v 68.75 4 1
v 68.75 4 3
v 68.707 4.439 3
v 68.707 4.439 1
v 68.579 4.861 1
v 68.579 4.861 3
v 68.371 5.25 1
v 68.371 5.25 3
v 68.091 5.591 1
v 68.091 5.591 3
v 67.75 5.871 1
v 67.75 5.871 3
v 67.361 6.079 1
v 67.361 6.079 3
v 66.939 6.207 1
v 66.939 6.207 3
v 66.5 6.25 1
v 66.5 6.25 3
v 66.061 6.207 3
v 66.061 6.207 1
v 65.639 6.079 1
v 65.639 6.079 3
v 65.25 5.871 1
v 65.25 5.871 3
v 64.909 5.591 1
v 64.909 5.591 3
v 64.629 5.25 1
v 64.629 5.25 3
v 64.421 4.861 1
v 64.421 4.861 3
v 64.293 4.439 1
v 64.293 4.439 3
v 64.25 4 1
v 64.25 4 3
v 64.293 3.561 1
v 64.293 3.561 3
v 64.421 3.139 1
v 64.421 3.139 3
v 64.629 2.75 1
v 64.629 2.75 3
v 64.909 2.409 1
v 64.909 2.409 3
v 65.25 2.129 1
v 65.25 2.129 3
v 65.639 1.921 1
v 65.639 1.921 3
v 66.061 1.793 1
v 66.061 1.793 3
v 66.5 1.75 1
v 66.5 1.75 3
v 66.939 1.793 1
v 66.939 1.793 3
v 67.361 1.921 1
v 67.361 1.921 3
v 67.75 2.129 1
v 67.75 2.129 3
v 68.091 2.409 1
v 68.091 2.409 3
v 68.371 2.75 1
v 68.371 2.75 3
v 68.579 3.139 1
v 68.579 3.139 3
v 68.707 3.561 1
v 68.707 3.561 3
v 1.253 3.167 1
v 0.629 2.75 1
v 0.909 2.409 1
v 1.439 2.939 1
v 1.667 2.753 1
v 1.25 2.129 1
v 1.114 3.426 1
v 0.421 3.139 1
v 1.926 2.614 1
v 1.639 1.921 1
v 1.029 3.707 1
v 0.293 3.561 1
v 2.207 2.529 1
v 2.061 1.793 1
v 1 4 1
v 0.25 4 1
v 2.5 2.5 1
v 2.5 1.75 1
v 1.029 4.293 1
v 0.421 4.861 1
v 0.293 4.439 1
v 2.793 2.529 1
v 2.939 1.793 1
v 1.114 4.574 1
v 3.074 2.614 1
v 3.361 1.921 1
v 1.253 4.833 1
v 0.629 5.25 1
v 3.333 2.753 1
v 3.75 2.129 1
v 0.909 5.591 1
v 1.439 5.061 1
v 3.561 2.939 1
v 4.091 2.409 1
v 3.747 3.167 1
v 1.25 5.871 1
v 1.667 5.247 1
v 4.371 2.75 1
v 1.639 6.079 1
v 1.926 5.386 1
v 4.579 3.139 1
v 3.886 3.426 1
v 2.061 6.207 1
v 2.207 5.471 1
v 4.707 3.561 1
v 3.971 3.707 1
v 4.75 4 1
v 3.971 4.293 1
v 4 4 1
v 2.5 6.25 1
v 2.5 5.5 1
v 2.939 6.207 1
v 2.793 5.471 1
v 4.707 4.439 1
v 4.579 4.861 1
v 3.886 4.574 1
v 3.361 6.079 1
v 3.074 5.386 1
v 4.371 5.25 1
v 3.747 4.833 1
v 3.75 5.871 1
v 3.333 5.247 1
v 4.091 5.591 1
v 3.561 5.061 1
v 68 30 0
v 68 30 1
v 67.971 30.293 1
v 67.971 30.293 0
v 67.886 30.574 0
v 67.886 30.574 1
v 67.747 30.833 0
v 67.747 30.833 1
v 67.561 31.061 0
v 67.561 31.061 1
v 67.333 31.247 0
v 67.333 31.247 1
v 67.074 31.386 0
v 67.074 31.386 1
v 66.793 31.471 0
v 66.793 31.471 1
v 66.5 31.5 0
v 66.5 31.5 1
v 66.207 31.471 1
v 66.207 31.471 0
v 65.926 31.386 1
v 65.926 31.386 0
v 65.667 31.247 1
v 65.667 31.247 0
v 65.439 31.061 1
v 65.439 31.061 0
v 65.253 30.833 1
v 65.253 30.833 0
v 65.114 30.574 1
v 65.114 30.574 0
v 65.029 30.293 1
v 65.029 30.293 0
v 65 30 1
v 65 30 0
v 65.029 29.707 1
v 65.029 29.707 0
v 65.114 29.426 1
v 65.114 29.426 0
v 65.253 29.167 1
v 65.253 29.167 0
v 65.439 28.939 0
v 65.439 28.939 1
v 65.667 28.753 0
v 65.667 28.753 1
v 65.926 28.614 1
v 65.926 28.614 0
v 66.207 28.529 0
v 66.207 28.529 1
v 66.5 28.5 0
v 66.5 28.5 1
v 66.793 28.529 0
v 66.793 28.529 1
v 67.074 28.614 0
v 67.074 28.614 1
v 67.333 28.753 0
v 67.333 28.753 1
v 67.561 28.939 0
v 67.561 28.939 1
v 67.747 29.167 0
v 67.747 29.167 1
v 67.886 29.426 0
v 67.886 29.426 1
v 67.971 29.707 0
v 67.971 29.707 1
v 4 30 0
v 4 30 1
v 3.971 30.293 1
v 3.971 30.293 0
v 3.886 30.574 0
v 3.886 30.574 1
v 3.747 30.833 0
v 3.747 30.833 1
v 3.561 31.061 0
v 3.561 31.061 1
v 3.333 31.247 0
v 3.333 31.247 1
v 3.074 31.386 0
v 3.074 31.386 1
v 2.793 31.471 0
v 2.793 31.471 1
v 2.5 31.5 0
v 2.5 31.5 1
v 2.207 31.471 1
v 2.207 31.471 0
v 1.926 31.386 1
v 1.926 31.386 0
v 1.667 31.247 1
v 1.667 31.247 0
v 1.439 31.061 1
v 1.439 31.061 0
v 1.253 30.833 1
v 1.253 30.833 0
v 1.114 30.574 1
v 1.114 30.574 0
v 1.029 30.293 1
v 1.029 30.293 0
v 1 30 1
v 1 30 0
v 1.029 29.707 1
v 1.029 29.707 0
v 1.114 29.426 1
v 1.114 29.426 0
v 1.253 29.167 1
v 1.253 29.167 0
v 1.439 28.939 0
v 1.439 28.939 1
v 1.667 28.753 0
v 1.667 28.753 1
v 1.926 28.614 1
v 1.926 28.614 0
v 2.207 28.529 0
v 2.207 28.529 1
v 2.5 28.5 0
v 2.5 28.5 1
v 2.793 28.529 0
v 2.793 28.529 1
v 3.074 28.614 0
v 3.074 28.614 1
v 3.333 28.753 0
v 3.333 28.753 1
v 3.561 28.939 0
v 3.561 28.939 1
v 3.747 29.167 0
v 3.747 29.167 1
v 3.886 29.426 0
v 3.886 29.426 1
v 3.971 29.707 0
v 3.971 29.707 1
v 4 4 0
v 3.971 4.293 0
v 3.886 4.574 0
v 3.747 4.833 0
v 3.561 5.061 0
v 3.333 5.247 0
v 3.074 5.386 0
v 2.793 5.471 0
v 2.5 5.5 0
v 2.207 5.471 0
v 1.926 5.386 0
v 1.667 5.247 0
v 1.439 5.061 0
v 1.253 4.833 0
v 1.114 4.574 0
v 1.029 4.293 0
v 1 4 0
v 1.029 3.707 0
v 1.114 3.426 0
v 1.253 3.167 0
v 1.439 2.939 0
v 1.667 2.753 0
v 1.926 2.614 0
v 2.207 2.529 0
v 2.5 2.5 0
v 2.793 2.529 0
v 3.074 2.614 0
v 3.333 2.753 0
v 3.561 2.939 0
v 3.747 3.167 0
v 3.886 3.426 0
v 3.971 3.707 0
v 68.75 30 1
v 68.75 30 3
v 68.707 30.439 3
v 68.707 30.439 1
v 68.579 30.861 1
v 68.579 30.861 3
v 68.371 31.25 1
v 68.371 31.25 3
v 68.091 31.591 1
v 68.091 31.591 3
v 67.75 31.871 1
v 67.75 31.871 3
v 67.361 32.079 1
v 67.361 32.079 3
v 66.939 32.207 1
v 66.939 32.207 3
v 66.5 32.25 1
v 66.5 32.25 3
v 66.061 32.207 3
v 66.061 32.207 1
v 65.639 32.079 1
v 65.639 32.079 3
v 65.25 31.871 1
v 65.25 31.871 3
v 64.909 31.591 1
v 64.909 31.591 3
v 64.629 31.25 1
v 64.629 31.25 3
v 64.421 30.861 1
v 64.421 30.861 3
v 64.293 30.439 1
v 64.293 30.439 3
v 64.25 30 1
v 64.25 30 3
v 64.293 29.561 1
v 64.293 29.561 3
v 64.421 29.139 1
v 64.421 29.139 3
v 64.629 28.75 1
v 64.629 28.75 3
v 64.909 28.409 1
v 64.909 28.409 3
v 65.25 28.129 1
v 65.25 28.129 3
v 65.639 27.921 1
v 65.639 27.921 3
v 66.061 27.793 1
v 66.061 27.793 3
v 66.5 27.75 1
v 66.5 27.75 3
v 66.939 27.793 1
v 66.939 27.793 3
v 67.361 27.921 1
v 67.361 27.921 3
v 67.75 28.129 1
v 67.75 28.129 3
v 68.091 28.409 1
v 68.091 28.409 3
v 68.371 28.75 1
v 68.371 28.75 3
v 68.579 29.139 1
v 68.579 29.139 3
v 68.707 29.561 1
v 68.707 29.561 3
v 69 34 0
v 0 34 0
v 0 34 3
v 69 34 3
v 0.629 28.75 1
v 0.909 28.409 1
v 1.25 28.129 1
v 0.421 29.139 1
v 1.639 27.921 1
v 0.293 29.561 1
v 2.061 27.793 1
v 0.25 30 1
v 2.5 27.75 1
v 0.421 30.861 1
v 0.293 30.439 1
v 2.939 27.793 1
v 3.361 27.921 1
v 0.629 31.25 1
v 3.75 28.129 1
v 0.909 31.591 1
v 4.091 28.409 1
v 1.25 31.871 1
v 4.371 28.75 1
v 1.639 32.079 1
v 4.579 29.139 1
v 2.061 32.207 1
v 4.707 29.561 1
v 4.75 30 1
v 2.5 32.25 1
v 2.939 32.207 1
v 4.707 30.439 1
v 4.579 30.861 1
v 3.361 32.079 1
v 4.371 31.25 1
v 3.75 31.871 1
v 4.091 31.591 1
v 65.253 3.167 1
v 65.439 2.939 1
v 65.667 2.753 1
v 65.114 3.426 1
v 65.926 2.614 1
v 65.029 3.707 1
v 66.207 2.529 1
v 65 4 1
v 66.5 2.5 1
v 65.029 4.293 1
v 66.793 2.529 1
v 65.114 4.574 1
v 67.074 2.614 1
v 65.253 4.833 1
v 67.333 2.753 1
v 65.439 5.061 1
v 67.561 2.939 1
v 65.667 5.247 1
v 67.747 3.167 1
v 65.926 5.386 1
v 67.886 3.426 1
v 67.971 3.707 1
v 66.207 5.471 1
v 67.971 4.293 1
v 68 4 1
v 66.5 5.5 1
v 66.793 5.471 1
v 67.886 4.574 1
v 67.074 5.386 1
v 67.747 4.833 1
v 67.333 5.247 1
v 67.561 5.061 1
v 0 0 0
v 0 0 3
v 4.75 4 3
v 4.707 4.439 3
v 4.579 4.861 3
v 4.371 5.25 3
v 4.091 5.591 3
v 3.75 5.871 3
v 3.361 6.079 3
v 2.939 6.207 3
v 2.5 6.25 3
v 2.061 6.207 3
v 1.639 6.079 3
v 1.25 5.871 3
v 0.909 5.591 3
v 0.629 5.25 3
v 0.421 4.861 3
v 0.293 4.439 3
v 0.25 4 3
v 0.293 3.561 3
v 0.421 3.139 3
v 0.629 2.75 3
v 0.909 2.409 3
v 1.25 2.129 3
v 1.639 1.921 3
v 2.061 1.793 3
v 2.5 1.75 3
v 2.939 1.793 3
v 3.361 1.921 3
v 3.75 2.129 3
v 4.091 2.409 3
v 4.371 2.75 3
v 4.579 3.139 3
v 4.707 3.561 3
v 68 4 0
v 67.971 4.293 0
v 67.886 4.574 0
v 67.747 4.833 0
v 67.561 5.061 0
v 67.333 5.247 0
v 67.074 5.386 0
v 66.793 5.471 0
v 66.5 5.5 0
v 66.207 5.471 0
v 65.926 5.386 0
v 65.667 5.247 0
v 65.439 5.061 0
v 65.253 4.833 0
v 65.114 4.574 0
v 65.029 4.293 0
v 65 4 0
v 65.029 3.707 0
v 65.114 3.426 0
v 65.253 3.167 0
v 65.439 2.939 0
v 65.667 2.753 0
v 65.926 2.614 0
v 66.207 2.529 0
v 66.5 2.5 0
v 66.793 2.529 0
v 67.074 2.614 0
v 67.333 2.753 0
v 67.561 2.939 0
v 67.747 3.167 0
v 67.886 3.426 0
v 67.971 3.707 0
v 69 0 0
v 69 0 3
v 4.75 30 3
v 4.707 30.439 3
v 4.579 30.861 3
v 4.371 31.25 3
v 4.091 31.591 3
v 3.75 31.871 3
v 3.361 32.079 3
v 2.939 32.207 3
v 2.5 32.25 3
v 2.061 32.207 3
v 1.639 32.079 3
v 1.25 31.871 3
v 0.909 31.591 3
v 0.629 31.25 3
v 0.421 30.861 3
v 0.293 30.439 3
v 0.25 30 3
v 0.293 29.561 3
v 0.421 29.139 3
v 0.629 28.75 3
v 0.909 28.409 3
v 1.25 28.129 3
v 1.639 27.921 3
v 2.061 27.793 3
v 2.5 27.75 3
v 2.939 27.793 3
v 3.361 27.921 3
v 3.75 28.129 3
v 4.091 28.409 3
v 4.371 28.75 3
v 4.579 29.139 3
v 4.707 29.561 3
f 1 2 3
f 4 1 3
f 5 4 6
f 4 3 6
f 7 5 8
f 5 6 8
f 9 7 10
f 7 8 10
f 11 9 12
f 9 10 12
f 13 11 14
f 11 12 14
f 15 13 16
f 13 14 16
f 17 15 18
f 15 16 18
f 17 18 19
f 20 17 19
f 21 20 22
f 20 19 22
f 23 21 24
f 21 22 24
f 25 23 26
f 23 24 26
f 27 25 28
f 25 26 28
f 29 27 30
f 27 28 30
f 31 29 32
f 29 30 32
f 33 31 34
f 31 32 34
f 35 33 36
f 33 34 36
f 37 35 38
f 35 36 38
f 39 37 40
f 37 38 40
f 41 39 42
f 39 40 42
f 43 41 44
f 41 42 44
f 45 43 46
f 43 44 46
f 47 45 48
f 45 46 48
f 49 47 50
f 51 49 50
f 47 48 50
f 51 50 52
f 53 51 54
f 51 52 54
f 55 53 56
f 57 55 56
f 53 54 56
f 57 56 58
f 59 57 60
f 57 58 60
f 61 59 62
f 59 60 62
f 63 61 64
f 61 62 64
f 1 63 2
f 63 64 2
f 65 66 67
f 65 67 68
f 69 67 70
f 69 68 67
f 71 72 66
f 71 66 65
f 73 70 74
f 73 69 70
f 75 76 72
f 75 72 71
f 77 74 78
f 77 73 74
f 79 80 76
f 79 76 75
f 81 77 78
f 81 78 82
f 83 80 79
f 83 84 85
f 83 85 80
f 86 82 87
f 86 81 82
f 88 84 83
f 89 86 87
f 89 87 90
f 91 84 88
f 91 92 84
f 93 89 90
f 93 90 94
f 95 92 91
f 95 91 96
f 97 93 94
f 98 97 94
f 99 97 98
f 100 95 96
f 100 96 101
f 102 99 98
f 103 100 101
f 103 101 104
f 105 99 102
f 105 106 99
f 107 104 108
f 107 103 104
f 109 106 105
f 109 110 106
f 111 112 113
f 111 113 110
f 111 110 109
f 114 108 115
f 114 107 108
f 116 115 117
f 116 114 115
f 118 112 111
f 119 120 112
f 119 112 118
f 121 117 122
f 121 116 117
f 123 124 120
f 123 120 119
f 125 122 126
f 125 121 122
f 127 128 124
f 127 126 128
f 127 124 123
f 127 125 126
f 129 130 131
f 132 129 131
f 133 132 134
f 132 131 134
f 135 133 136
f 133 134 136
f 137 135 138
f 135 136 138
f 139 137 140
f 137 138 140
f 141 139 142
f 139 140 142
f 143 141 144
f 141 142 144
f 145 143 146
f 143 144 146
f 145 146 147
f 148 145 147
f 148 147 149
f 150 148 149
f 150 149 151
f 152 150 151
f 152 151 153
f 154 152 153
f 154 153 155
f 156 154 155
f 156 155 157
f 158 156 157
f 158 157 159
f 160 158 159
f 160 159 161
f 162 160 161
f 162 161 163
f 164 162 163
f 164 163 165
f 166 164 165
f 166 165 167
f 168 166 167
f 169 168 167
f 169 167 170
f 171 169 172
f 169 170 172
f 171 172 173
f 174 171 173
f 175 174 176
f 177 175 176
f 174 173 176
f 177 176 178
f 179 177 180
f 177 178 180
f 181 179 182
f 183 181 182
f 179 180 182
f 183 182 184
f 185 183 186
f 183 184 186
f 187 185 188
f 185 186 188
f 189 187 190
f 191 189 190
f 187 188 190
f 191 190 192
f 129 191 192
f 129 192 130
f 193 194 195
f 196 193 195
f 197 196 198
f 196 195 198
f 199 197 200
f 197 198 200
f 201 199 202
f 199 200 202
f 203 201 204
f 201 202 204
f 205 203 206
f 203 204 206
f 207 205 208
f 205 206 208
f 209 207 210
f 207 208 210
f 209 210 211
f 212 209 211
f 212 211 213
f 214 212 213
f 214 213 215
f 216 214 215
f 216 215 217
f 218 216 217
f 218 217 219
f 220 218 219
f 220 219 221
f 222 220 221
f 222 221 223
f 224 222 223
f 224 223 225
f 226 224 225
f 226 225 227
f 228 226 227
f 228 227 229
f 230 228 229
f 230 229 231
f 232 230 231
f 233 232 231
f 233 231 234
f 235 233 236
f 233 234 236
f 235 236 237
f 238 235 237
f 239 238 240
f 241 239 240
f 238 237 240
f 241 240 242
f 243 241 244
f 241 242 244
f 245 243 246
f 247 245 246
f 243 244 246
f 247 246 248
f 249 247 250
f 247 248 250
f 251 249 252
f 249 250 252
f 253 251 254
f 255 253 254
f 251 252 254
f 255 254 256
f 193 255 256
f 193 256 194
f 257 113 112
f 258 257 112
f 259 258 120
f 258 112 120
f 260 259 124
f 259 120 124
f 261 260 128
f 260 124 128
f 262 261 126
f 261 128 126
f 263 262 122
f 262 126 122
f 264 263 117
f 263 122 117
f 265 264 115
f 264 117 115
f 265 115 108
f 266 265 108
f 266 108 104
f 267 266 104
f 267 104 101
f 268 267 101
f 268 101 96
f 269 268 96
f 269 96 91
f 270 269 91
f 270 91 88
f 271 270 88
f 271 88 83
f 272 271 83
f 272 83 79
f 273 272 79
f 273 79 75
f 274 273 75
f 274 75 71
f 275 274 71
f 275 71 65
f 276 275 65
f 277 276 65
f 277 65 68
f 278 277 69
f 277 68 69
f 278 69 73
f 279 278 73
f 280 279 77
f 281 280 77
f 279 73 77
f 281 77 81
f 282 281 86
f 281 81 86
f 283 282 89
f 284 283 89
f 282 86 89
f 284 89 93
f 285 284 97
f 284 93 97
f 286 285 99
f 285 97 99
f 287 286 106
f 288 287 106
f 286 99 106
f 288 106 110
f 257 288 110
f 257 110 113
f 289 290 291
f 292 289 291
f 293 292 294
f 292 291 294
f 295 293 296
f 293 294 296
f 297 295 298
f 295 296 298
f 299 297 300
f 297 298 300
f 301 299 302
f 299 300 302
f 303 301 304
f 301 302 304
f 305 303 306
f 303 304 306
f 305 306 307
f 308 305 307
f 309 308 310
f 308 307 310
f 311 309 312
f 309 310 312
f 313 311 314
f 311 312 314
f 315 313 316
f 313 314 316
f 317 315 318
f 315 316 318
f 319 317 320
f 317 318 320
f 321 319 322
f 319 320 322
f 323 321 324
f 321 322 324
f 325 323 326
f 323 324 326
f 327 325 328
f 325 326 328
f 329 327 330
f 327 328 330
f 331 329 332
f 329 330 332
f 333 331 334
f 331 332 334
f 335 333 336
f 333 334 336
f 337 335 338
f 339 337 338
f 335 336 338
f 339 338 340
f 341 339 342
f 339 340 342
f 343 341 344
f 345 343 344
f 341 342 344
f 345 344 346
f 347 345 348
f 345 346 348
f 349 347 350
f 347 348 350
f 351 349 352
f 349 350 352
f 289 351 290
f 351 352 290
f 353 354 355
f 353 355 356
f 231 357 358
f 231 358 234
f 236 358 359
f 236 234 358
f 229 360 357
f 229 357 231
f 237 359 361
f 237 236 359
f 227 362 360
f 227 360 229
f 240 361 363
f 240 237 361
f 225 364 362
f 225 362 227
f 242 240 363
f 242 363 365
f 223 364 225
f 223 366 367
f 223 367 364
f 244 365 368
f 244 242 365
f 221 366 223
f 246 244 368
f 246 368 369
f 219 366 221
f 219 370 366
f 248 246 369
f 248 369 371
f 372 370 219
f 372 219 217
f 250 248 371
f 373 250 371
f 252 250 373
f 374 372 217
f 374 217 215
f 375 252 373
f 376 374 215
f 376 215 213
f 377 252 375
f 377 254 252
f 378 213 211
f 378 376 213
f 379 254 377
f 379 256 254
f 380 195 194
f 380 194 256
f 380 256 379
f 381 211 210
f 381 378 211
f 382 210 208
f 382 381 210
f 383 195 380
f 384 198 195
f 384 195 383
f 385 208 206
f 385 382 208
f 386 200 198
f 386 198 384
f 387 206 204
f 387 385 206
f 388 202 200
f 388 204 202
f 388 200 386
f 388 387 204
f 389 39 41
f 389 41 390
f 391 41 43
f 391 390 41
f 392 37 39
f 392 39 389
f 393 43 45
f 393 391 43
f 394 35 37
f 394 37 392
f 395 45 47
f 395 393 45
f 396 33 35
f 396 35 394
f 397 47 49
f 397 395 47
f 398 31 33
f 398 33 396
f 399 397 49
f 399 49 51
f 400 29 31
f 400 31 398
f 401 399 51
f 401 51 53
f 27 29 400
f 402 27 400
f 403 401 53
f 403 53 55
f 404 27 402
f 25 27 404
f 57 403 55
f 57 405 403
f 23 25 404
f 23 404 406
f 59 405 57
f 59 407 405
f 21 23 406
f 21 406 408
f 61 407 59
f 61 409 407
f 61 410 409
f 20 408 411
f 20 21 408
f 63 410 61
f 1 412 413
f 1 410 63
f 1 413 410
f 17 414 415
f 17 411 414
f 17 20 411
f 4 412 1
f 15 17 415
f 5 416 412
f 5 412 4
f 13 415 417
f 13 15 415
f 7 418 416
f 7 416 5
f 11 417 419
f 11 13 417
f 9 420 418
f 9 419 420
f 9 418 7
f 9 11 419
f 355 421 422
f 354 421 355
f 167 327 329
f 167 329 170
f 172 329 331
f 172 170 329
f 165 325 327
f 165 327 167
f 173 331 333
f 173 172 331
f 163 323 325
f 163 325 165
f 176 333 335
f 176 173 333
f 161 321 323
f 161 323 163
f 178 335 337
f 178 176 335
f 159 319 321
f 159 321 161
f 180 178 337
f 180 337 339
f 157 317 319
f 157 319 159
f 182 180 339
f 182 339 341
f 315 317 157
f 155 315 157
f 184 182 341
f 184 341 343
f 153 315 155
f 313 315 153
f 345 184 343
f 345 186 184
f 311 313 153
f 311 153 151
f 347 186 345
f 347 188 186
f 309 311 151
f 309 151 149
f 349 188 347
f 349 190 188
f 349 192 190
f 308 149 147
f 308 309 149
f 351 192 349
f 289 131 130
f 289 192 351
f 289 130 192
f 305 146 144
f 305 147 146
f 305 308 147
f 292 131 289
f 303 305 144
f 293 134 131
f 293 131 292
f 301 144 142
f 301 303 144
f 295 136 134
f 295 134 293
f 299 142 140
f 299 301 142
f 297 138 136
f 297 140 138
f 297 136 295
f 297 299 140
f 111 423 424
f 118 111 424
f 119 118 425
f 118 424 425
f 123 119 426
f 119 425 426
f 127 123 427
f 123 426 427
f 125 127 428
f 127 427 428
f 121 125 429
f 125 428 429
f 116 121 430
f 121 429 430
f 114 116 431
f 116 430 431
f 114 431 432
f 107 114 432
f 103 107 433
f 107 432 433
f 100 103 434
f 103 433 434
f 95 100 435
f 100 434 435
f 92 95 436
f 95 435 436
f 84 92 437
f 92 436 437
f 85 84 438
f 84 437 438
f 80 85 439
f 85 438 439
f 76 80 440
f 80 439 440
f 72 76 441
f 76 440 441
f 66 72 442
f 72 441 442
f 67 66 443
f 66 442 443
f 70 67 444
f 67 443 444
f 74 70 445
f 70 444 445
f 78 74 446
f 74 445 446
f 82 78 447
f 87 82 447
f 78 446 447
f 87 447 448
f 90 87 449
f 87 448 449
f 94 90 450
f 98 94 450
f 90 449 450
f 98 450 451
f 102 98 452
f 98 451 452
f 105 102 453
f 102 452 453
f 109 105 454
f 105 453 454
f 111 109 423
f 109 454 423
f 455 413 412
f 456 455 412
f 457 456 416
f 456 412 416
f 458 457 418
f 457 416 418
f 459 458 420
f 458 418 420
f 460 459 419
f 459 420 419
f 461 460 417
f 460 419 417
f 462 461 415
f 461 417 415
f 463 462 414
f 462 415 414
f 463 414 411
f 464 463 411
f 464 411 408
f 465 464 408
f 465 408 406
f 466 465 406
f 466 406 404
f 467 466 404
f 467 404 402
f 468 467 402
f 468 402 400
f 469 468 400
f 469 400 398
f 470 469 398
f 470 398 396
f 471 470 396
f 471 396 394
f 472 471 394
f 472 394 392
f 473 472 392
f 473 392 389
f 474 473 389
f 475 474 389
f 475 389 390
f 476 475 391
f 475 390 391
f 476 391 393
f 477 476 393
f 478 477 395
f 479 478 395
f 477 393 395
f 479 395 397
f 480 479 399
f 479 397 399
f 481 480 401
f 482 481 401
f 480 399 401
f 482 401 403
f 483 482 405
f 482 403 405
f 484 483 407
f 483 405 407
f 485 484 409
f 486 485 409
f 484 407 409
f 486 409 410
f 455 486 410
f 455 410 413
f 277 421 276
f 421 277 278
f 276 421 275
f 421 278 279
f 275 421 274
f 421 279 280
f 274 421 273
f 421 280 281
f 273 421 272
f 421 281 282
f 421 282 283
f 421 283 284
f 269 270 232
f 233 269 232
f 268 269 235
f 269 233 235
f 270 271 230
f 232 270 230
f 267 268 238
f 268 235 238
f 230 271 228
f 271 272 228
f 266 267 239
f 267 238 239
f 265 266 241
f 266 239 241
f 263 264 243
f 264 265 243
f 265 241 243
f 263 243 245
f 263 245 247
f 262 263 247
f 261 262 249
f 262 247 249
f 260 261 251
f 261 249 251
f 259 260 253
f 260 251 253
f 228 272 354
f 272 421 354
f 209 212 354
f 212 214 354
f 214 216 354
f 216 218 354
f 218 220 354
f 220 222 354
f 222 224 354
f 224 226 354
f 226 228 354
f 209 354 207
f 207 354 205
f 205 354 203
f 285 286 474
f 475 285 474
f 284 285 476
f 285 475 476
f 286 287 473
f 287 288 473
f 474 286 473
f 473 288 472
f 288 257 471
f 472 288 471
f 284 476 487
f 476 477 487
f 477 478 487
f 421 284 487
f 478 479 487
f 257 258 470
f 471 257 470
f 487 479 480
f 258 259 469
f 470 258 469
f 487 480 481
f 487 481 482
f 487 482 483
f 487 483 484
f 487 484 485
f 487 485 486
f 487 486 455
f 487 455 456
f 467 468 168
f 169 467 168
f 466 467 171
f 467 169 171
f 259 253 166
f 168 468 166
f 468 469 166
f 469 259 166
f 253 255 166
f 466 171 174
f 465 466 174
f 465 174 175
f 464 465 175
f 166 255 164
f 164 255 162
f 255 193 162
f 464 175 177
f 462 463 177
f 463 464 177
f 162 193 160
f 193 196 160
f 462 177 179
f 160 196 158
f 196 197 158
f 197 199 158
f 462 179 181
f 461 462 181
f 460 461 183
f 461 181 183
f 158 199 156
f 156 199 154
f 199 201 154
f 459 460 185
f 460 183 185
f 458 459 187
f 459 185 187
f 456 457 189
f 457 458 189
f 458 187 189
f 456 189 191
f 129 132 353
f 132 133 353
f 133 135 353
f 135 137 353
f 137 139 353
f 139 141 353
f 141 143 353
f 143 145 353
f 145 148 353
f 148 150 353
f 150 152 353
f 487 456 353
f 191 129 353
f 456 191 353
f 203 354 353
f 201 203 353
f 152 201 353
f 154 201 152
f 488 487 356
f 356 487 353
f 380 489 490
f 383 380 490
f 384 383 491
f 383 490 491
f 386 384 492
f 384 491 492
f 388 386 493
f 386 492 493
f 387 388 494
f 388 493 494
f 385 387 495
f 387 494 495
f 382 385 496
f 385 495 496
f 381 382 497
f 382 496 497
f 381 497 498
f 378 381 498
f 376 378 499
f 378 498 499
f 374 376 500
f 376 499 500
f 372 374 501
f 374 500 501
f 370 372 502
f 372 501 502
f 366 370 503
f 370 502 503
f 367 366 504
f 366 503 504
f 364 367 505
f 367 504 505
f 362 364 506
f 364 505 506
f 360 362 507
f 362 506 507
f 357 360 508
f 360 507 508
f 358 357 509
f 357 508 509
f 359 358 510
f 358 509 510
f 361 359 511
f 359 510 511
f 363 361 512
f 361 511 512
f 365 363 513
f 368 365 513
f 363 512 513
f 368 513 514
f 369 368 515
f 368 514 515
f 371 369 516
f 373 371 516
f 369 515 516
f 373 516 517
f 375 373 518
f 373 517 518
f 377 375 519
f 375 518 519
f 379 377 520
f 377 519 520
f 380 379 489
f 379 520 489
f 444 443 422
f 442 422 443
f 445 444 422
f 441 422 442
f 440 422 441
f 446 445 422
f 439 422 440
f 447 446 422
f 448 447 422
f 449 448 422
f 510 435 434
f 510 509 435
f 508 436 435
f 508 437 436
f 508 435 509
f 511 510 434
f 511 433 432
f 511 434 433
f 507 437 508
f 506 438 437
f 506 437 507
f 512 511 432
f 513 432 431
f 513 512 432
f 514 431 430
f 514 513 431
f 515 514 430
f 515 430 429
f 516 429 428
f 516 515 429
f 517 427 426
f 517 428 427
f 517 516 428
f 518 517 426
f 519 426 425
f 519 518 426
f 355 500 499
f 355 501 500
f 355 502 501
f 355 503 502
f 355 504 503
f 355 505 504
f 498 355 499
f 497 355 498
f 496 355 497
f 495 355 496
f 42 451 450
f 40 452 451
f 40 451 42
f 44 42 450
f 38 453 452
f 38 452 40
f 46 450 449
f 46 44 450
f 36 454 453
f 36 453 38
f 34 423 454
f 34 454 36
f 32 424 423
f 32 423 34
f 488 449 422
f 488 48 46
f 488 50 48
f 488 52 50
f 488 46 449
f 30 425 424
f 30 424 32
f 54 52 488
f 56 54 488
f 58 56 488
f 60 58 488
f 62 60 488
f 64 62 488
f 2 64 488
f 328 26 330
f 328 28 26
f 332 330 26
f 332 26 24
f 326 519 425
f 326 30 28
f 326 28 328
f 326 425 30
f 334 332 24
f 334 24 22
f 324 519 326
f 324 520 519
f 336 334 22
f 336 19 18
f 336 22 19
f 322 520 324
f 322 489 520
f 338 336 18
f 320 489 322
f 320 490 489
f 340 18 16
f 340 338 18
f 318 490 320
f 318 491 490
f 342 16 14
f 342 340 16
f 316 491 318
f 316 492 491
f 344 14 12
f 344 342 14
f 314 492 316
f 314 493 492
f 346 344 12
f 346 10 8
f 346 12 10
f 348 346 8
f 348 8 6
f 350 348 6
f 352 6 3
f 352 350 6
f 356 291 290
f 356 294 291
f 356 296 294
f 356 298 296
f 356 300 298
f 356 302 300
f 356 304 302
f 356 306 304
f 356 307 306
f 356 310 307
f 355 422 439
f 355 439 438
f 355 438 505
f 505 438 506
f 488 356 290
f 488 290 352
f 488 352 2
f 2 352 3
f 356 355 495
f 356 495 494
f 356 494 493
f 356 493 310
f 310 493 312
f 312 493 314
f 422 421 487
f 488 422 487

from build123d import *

# Parameters (mm, degrees)
SZKIC1_W                    = 69
SZKIC1_H                    = 34
DODANIE_WYCI_GNI_CIE1_DEPTH = 3
SZKIC2_R                    = 1.5
WYTNIJ_WYCI_GNI_CIE1_DEPTH  = 3
SZKIC3_R                    = 2.25
WYTNIJ_WYCI_GNI_CIE2_DEPTH  = 2


with BuildPart() as part:
    # Szkic1 → Dodanie-wyciągnięcie1 (new body)
    with BuildSketch(Plane.XY):
        with Locations((34.5, 17)):
            Rectangle(SZKIC1_W, SZKIC1_H)
    extrude(amount=DODANIE_WYCI_GNI_CIE1_DEPTH)

    # Szkic2 → Wytnij-wyciągnięcie1 (cut)
    with BuildSketch(Plane.XY.offset(3)):
        with Locations((2.5, 30)):
            Circle(SZKIC2_R)
        with Locations((2.5, 4)):
            Circle(SZKIC2_R)
        with Locations((66.5, 4)):
            Circle(SZKIC2_R)
        with Locations((66.5, 30)):
            Circle(SZKIC2_R)
    extrude(amount=-WYTNIJ_WYCI_GNI_CIE1_DEPTH, mode=Mode.SUBTRACT)

    # Szkic3 → Wytnij-wyciągnięcie2 (cut)
    with BuildSketch(Plane.XY.offset(3)):
        with Locations((2.5, 30)):
            Circle(SZKIC3_R)
        with Locations((66.5, 30)):
            Circle(SZKIC3_R)
        with Locations((2.5, 4)):
            Circle(SZKIC3_R)
        with Locations((66.5, 4)):
            Circle(SZKIC3_R)
    extrude(amount=-WYTNIJ_WYCI_GNI_CIE2_DEPTH, mode=Mode.SUBTRACT)


solid = part.part
